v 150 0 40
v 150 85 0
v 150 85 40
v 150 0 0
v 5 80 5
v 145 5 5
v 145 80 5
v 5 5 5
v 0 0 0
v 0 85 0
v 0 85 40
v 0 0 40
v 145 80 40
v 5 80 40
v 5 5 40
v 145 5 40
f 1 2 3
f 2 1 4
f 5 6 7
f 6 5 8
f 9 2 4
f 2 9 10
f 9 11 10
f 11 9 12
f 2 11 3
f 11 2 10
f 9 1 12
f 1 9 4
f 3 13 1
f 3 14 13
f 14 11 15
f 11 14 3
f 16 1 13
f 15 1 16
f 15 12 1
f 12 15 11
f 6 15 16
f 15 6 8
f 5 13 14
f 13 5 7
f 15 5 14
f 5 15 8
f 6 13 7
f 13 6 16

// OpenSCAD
union() {
cube (size=[150,85,5]);
translate([0,0,5]) cube (size=[150,5,35]);
translate([0,80,5]) cube (size=[150,5,35]);
translate([0,0,5]) cube (size=[5,85,35]);
translate([145,0,5]) cube (size=[5,85,35]);

}
